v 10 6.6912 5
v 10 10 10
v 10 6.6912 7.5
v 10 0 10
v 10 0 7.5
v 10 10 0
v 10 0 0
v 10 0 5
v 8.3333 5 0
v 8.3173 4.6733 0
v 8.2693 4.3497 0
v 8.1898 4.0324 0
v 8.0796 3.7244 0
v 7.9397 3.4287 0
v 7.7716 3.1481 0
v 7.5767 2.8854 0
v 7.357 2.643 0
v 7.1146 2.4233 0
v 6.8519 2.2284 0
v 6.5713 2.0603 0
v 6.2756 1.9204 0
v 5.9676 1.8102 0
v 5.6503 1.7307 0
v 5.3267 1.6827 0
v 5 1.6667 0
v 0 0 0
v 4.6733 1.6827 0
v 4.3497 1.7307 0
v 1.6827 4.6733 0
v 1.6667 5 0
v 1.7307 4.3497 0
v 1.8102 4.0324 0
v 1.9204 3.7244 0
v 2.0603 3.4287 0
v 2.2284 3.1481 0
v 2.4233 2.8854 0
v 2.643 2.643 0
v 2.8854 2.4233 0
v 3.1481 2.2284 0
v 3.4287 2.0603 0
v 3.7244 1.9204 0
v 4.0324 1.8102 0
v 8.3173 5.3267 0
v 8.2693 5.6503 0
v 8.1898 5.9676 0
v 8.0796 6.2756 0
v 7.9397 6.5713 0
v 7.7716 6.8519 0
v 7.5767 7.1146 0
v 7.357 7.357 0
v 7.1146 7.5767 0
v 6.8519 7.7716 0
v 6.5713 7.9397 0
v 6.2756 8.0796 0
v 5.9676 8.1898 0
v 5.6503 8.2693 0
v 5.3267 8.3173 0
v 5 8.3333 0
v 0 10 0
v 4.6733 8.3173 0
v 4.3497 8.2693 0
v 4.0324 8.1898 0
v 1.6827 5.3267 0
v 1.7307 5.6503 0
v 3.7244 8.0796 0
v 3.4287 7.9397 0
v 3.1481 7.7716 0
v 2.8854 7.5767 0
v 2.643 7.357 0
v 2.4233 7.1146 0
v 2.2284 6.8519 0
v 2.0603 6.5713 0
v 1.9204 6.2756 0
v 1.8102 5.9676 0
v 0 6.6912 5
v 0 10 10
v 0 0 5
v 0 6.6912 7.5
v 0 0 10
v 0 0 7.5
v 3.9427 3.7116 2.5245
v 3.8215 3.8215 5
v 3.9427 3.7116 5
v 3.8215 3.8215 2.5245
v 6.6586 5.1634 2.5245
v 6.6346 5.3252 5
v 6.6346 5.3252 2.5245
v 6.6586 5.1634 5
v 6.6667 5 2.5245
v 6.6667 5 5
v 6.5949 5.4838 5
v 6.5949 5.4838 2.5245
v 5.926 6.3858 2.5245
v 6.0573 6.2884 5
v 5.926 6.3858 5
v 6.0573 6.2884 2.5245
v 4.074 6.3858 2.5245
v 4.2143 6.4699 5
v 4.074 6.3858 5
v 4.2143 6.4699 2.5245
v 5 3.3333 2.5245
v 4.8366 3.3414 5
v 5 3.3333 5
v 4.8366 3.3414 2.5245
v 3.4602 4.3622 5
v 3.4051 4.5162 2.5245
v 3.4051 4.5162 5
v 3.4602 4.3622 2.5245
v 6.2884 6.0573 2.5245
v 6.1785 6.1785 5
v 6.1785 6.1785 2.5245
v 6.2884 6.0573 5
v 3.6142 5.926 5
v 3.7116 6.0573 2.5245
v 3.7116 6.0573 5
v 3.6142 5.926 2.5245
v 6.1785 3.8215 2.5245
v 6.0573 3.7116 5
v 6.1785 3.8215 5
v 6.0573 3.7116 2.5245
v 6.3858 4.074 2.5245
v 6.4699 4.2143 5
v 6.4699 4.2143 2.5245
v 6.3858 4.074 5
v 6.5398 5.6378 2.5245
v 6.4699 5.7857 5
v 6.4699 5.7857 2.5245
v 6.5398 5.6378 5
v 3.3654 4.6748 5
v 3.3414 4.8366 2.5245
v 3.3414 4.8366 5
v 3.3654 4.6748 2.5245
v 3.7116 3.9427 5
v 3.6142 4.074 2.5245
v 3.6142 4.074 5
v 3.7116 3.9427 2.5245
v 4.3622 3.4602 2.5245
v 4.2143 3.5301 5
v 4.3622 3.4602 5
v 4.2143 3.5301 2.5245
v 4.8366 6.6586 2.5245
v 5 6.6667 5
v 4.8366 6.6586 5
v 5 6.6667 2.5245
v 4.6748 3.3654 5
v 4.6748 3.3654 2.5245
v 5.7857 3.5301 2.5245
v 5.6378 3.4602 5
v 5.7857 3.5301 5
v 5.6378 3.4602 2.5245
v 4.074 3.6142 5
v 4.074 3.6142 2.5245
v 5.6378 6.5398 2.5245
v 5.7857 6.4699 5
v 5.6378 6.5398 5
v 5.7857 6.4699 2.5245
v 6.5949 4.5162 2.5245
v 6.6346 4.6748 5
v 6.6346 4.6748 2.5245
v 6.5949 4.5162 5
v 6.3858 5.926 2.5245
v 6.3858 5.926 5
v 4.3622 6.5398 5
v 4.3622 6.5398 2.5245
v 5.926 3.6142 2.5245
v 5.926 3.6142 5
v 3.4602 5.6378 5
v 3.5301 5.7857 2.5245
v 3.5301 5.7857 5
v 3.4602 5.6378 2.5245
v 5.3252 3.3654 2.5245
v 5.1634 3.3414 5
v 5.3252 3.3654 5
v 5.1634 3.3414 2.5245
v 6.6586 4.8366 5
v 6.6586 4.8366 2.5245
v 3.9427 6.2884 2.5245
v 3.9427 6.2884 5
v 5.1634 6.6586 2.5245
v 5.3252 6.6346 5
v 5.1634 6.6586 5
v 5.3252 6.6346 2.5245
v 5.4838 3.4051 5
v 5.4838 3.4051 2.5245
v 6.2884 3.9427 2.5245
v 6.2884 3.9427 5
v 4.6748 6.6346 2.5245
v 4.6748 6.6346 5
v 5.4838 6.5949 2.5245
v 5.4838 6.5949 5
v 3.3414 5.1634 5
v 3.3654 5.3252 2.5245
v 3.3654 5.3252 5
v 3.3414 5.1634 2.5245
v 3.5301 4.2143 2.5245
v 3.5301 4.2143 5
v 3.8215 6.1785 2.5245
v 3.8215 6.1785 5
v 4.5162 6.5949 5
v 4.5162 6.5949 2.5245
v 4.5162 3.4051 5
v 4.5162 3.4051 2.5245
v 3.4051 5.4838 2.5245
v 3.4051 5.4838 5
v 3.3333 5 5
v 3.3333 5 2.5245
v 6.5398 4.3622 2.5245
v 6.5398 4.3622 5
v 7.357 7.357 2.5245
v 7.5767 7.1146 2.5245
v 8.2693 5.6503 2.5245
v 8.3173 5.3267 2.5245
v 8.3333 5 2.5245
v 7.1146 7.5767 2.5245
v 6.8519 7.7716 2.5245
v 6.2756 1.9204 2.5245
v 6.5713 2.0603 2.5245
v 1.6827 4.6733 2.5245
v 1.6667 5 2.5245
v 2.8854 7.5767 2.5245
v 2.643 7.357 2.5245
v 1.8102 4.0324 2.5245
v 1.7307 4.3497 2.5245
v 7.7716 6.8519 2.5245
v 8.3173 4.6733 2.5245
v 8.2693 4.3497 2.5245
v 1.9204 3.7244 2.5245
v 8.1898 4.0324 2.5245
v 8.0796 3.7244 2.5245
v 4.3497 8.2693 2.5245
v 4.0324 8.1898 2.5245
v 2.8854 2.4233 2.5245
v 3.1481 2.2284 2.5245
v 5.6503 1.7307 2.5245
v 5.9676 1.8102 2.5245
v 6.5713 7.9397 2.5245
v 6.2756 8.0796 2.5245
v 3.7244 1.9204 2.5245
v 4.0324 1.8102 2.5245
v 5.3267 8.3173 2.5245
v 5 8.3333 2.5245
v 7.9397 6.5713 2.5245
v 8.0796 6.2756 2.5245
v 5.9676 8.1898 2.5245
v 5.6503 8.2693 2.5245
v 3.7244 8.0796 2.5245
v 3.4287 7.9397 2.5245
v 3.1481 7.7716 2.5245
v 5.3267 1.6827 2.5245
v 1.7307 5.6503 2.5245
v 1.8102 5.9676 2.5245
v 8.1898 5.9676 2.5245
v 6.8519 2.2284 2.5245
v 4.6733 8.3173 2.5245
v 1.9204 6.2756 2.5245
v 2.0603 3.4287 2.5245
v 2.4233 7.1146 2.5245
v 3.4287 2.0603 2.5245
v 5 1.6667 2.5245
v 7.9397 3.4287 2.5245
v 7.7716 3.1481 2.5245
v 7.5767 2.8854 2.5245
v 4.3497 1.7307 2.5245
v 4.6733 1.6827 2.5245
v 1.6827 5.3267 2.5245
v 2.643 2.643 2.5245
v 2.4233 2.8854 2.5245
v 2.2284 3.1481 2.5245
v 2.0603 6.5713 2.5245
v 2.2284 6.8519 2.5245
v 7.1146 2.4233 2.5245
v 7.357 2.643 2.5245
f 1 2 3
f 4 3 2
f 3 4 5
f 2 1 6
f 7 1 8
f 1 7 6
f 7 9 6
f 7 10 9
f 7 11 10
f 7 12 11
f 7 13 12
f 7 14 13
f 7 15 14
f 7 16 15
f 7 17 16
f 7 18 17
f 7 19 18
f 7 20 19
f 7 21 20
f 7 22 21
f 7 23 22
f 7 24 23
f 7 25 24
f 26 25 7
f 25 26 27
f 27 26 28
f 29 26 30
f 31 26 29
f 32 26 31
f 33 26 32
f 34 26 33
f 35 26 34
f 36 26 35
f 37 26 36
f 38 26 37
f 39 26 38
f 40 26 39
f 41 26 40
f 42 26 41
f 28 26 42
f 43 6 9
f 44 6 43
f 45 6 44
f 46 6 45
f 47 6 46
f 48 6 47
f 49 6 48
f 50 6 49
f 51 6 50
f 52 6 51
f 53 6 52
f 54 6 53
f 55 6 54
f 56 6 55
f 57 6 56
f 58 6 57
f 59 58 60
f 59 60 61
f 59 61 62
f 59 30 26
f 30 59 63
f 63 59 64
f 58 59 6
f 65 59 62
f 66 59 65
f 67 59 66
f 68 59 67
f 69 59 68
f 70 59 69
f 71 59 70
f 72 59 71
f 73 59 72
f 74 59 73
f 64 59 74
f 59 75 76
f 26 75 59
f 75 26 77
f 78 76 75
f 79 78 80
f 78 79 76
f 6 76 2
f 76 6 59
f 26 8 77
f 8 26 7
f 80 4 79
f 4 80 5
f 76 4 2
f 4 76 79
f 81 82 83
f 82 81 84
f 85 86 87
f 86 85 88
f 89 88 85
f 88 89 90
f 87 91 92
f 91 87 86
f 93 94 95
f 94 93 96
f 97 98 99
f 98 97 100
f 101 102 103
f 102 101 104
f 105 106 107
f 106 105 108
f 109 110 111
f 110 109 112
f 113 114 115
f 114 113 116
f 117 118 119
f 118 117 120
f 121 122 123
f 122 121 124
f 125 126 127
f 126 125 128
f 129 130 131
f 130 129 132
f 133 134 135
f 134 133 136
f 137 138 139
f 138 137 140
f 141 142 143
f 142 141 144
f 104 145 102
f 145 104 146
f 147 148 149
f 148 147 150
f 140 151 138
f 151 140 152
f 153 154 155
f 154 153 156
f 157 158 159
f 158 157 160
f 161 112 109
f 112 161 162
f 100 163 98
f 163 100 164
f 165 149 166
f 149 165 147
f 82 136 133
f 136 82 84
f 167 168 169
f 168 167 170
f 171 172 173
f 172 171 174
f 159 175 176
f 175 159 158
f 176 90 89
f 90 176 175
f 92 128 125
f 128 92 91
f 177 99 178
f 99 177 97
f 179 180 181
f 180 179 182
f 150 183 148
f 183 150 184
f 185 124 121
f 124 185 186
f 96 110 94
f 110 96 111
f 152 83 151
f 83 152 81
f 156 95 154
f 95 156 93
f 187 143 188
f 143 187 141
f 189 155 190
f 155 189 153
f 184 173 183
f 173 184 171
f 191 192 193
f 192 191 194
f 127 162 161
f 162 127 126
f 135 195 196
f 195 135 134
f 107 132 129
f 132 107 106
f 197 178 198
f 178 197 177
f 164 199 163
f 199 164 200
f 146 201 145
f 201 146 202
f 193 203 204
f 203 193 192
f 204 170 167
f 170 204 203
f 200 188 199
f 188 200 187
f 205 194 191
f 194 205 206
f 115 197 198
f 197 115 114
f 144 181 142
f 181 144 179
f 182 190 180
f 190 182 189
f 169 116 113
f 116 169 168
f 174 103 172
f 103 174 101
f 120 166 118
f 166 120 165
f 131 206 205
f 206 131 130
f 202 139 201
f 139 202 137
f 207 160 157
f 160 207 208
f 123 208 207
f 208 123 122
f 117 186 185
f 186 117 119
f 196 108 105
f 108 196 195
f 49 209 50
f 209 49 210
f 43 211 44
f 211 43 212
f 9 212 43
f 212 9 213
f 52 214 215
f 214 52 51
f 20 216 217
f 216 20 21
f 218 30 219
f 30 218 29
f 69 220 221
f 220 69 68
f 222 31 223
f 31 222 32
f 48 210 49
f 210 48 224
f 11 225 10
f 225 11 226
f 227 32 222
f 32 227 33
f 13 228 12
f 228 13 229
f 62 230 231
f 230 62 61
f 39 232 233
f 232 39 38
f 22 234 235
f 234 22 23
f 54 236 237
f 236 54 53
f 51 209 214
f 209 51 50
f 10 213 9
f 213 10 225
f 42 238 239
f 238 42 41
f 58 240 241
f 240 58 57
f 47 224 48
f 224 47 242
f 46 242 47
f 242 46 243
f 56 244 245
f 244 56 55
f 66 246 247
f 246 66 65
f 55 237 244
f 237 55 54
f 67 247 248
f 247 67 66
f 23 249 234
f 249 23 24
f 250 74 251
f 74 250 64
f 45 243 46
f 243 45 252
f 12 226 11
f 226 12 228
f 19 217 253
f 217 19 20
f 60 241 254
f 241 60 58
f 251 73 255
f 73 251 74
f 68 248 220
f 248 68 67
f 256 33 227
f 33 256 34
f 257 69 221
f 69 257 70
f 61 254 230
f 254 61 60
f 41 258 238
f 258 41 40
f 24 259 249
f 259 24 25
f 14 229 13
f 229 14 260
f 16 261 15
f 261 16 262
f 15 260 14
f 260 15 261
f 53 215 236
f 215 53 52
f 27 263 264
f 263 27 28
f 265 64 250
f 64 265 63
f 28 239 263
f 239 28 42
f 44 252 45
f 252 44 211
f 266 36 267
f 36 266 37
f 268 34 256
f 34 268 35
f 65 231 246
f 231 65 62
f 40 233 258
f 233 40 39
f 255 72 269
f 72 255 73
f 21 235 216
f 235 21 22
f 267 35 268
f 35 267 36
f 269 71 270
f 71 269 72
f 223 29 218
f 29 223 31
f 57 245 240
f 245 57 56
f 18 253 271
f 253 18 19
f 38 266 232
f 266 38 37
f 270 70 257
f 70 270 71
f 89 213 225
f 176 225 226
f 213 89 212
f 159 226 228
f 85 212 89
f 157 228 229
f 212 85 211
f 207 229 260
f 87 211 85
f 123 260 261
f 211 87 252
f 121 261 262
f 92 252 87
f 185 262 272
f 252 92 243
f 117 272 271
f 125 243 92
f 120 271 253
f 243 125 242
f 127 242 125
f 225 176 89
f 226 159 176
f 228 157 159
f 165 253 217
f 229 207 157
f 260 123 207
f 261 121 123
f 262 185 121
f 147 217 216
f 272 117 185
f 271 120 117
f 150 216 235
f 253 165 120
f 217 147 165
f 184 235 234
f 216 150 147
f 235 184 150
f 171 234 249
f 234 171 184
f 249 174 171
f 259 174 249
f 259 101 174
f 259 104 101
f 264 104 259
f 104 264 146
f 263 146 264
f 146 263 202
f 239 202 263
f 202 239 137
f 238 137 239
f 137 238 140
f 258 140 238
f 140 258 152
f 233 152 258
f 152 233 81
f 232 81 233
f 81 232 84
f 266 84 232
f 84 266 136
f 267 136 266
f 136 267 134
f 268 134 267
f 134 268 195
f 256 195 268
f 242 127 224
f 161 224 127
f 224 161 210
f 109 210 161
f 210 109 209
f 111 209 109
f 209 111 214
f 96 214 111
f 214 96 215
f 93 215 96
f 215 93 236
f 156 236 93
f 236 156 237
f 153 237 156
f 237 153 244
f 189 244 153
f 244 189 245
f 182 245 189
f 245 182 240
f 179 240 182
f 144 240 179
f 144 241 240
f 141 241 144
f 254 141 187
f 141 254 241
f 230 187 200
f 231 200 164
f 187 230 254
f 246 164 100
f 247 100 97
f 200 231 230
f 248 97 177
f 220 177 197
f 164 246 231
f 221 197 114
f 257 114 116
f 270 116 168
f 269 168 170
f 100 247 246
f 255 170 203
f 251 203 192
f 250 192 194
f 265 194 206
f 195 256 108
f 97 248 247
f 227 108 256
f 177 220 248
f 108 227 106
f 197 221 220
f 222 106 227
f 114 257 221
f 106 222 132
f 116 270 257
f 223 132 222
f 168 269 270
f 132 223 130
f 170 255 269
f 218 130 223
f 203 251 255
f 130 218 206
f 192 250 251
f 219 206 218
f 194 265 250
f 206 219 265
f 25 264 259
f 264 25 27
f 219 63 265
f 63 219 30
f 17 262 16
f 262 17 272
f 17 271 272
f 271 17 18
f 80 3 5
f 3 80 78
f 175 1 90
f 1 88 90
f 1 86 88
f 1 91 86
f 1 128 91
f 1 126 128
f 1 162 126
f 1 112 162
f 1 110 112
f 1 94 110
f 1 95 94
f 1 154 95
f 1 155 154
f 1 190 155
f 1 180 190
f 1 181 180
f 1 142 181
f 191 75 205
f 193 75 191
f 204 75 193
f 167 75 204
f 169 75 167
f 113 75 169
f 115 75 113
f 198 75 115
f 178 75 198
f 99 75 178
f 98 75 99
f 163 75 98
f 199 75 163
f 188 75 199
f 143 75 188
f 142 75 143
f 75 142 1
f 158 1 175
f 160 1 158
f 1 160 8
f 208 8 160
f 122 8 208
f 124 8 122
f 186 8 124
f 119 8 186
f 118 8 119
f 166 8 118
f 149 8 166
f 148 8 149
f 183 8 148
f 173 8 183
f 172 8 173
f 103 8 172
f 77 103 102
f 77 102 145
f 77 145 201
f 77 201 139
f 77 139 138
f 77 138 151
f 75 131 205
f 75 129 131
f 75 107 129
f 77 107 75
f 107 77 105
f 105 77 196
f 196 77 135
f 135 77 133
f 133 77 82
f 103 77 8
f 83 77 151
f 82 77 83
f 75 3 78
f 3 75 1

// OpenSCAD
// file: ../modules/bed-level-test.scad
module bed_level_test(){
	do_spots = bed_level_test_mode == "spot" || bed_level_test_mode == "both";
	do_lines = bed_level_test_mode == "line" || bed_level_test_mode == "both";
	linewidth = bed_level_line_width*extrusion_width;
	divs = bed_level_divisions-1;
	spot_spacing = [
		(bed_size_x-bed_level_padding*2-bed_level_spot_size[0])/divs,
		(bed_size_y-bed_level_padding*2-bed_level_spot_size[1])/divs
	];
	line_length = do_spots ? [
		bed_size_x-bed_level_padding*2-bed_level_spot_size[0],
		bed_size_y-bed_level_padding*2-bed_level_spot_size[1]
	] : [
		bed_size_x-bed_level_padding*2,
		bed_size_y-bed_level_padding*2
	];
	union() {
		if (do_spots) {
			for (x=[0:divs]){
				for (y=[0:divs]){
					translate([
						spot_spacing[0]*(x-(floor(divs/2))),
						spot_spacing[1]*(y-(floor(divs/2))),
						0
					]){
						cube([bed_level_spot_size[0],bed_level_spot_size[1],layer_height],center=true);
					}
				}
			}
		}
		if (do_lines) {
			for (i=[0:divs]){
				translate([
					0,
					do_spots ? spot_spacing[1]*(i-(floor(divs/2))) : (spot_spacing[1]+(bed_level_spot_size[1]-bed_level_line_width*extrusion_width)/2)*(i-(floor(divs/2))) ,
					0
				]){
					cube([line_length[0],linewidth,layer_height], center=true);
				} 
			}
			for (i=[0:divs]){
				translate([
					do_spots ? spot_spacing[0]*(i-(floor(divs/2))) : (spot_spacing[0]+(bed_level_spot_size[0]-bed_level_line_width*extrusion_width)/2)*(i-(floor(divs/2))),
					0,
					0
				]){
					cube([linewidth,line_length[1],layer_height], center=true);
				} 
			}
		}
	}
}
// file: ../modules/support-test.scad
module support_test(size){
	union(){
		difference(){
			union() {
				cube([size,size,support_cube_height/2]);
				translate([0,0,support_cube_height/2])
				cube([size,size,support_cube_height/2]);
			}
			translate([size/2,size/2,-slice_gap_closing_radius/2]){
				cylinder(r=size/6,h=support_cube_height/2+slice_gap_closing_radius);
				cylinder(r=size/3,h=support_cube_height/4+slice_gap_closing_radius);
			}
			translate([-slice_gap_closing_radius/2,-slice_gap_closing_radius/2,support_cube_height/2])
			cube([size+slice_gap_closing_radius,size*2/3+slice_gap_closing_radius,support_cube_height/4]);
		}
	}
}

support_test_size = [
	support_cube_size,
	support_cube_size,
	support_cube_height
];
// file: ../modules/chimney-test.scad
// /* [Chimney test settings] */
// // Chimney base height (layers)
// chimney_base_height = 10; // 1
// // Chimney top height (layers)
// chimney_top_height = 5; // 1
// // Chimney base wall thickness (extrusions)
// chimney_base_wall_thickness = 4; // 1
// // Chimney top extra thickness (extrusions)
// chimney_top_extra_thickness = 2; // 1
// // Chimney hole start diameter (mm)
// chimney_hole_start_diameter = 3; // 1
// // Chimney hole end diameter (mm)
// chimney_hole_end_diameter = 12; // 1
// // Chimney hole diameter step (mm)
// chimney_hole_diameter_step = 3; // 1


module chimney_single(diameter) {
	difference(){
		union(){
			cylinder(h=chimney_base_height*layer_height, d=diameter+chimney_base_wall_thickness*extrusion_width*2);
			translate([0,0,chimney_base_height*layer_height]){
				cylinder(h=chimney_top_height*layer_height, d=diameter+(chimney_top_extra_thickness+chimney_base_wall_thickness)*extrusion_width*2);
			}
		}
		translate([0,0,-slice_gap_closing_radius/2])
		cylinder(h=(chimney_top_height+chimney_base_height)*layer_height+slice_gap_closing_radius, d=diameter);
	}
}

module chimney_test(){
	translate([
		(chimney_hole_start_diameter+(chimney_base_wall_thickness+chimney_top_extra_thickness)*extrusion_width*2)/2,
		(chimney_hole_end_diameter+(chimney_base_wall_thickness+chimney_top_extra_thickness)*extrusion_width*2)/2,
		0
	])
	for (i= [0:1:(chimney_hole_end_diameter-chimney_hole_start_diameter)/chimney_hole_diameter_step]){
		translate([
			gaussian_sum_with_step(chimney_hole_start_diameter+chimney_hole_diameter_step, chimney_hole_start_diameter+chimney_hole_diameter_step*i, chimney_hole_diameter_step)
				-(chimney_hole_start_diameter/2)*i
				+i*(chimney_base_wall_thickness+chimney_top_extra_thickness)*extrusion_width*2
				+test_padding*extrusion_width*i
			,0,
			0
		]){
			chimney_single(chimney_hole_start_diameter+chimney_hole_diameter_step*i);
		}
	}
}

_i = (chimney_hole_end_diameter-chimney_hole_start_diameter)/chimney_hole_diameter_step;

_chimney_size_x = (chimney_hole_start_diameter+(chimney_base_wall_thickness+chimney_top_extra_thickness)*extrusion_width*2)/2
	+ gaussian_sum_with_step(chimney_hole_start_diameter+chimney_hole_diameter_step, chimney_hole_start_diameter+chimney_hole_diameter_step*_i, chimney_hole_diameter_step)
				-(chimney_hole_start_diameter/2)*_i
				+_i*(chimney_base_wall_thickness+chimney_top_extra_thickness)*extrusion_width*2
				+test_padding*extrusion_width*_i;

chimney_test_size = [
	_chimney_size_x+(chimney_hole_end_diameter+(chimney_base_wall_thickness+chimney_top_extra_thickness)*extrusion_width*2)/2,
	chimney_hole_end_diameter+(chimney_base_wall_thickness+chimney_top_extra_thickness)*extrusion_width*2,
	(chimney_base_height+chimney_top_height)*layer_height
];
// file: ../modules/text-test.scad
module text_test_single(size, debug = false) {
	text_width = size*len(str(size, ": ",ts_string))*ts_adv_width_scaling;
	if (debug){
		%cube([text_width, size*ts_adv_height_scaling, ts_depth*layer_height], center=true);
		color(color_scheme[7%len(color_scheme)]) linear_extrude(height=layer_height)
		text(str(size, ": ",ts_string), size=size, font=ts_adv_font, halign="center", valign="center");
	}
	else {
		text(str(size, ": ",ts_string), size=size, font=ts_adv_font, halign="center", valign="center");
	}
}

module text_test() {
	echo("Generating text test");
	text_max_width = ts_end*len(str(ts_end, ": ",ts_string))*ts_adv_width_scaling;
	difference() {
		cube([text_max_width, text_height_sum, ts_depth*layer_height+slice_gap_closing_radius]);
		union(){
			for (i = [0:1:(ts_end-ts_start)/ts_step]) {
				current_size = ts_start+i*ts_step;
				echo(str("Text size ", i+1, ": size: ", current_size));
				text_width = current_size*len(str(current_size, ": ",ts_string))*ts_adv_width_scaling;
				/* 
				* I legit have no clue how this works or if gaussian sum is applicable here 
				* but it does work so don't touch it
				* Also: this breaks if you use the gaussian sum without factor
				* even though the factor is 1 so... something weird is going on
				*/
				translate_y = gauss_with_step_and_factor(ts_start,ts_start+i*ts_step,ts_step,1)*ts_adv_height_scaling*ts_step-ts_adv_height_scaling*i*ts_step;
				echo(str("Translate y: ", translate_y));
				translate([0,
					translate_y+ts_min_dist*i*extrusion_width,
				0]){
					// Move to +x+y quadrant
					translate([
						text_width/2,
						(current_size*ts_adv_height_scaling)/2,
						// workaround for preview glitching
						ts_depth*layer_height-slice_gap_closing_radius/2
					]){
						linear_extrude(height=ts_depth*layer_height*2, center=true){
							text_test_single(current_size);
						}
					}
				}
			}
		}
	}
}


// Text
text_height_sum = gauss_with_step_and_factor(ts_start,ts_end,ts_step,1)*ts_adv_height_scaling*ts_step-ts_adv_height_scaling*((ts_end-ts_start)/ts_step)*ts_step +ts_end*ts_adv_height_scaling+ts_min_dist*((ts_end-ts_start)/ts_step)*extrusion_width;

text_test_size = [
	ts_end*len(str(ts_end, ": ",ts_string))*ts_adv_width_scaling,
	text_height_sum,
	ts_depth*layer_height
];
// file: ../modules/accuracy-test.scad
module accuracy_cube(size, text_depth) {
	render()
	difference(){
		cube([size, size, size]);
		union(){
			rotate([90,0,0])
			translate([size/2,size/2,0])
			linear_extrude(height=text_depth*layer_height*2,center=true){
				text("-Y", size=(size/2), font="Liberation Mono:style=Regular", halign="center", valign="center");
			}
			translate([size/2,size,size/2])
			rotate([-90,0,0])
			rotate([0,0,180])
			linear_extrude(height=text_depth*layer_height*2,center=true){
				text("+Y", size=(size/2), font="Liberation Mono:style=Regular", halign="center", valign="center");
			}
			rotate([0,-90,0])
			translate([size/2,size/2,0])
			linear_extrude(height=text_depth*layer_height*2,center=true){
				rotate([0,0,-90])
				text("-X", size=(size/2), font="Liberation Mono:style=Regular", halign="center", valign="center");
			}
			translate([size,size/2,size/2])
			rotate([0,90,0])
			linear_extrude(height=text_depth*layer_height*2,center=true){
				rotate([0,0,90])
				text("+X", size=(size/2), font="Liberation Mono:style=Regular", halign="center", valign="center");
			}
			translate([size/2,size/2,0])
			linear_extrude(height=text_depth*layer_height*2,center=true){
				text("-Z", size=(size/2), font="Liberation Mono:style=Regular", halign="center", valign="center");
			}
			translate([size/2,size/2,size])
			linear_extrude(height=text_depth*layer_height*2,center=true){
				text("+Z", size=(size/2), font="Liberation Mono:style=Regular", halign="center", valign="center");
			}

		}
	}
}

module accuracy_cylinder(size, text_depth) {
	render()
	difference(){
		translate([size/2,size/2,size/2])
		cylinder(h=size, r=size/2, center=true);
		translate([size/2,size/2,size])
		linear_extrude(height=text_depth*layer_height*2, center=true)
		text(str(size), size=(size/2)*0.75, font="Liberation Mono:style=Regular", halign="center", valign="center");
	}
}

module accuracy_test(){
	if (dimensional_accuracy_test_mode == "cube" || dimensional_accuracy_test_mode == "both") {
		for (i = [0:1:(dimensional_accuracy_test_end-dimensional_accuracy_test_start)/dimensional_accuracy_test_step]) {
			current_size = dimensional_accuracy_test_start+i*dimensional_accuracy_test_step;
			translate([i==0?0:gaussian_sum_with_step(dimensional_accuracy_test_start,i*dimensional_accuracy_test_step,dimensional_accuracy_test_step)+test_padding*extrusion_width*i,0,0]){
				accuracy_cube(current_size, dimensional_accuracy_test_text_depth);
				echo(str("Cube ", i+1, ": size: ", current_size));
				if (dimensional_accuracy_test_mode == "both") {
					translate([0,current_size+test_padding*extrusion_width,0])
					accuracy_cylinder(current_size, dimensional_accuracy_test_text_depth);
					echo(str("Cylinder ", i+1, ": size: ", current_size));
				}
			}
		}
	}
	if (dimensional_accuracy_test_mode == "cylinder") {
		for (i = [0:1:(dimensional_accuracy_test_end-dimensional_accuracy_test_start)/dimensional_accuracy_test_step]) {
			current_size = dimensional_accuracy_test_start+i*dimensional_accuracy_test_step;
			translate([i==0?0:gaussian_sum_with_step(dimensional_accuracy_test_start,i*dimensional_accuracy_test_step,dimensional_accuracy_test_step)+test_padding*extrusion_width*i,0,0]){
				accuracy_cylinder(current_size, dimensional_accuracy_test_text_depth);
				echo(str("Cylinder ", i+1, ": size: ", current_size));
			}
		}
	}
}


// Accuracy
_dim_mult = dimensional_accuracy_test_mode == "both" ? 1 : 0;
accuracy_test_size = [
	gaussian_sum_with_step(dimensional_accuracy_test_start,dimensional_accuracy_test_end,dimensional_accuracy_test_step)+test_padding*extrusion_width*(dimensional_accuracy_test_end-dimensional_accuracy_test_start)/dimensional_accuracy_test_step,
	dimensional_accuracy_test_end+(dimensional_accuracy_test_end+test_padding*extrusion_width)*_dim_mult,
	dimensional_accuracy_test_end
];
// file: ../modules/sphere-test.scad
module sphere_test_bowl(size) {
	echo(str("Generating bowl, size: ", size));
	difference(){
		difference(){
			sphere(size/2);
			translate([0,0,-size/2]){
				cube([size, size, size], center=true);
			}
		}
		translate([0,0,size/1.5]){
			sphere(size/2);
		}
	}
}

module sphere_test_sphere(size) {
	echo(str("Generating sphere, size: ", size));
	difference(){
		sphere(size/2);
		translate([0,0,-size/2]){
			cube([size, size, size], center=true);
		}
	}
}

module sphere_test() {
	translate([0,sphere_test_end/2,0])
	for (i = [0:1:(sphere_test_end-sphere_test_start)/sphere_test_step]) {
		current_diameter = sphere_test_start+i*sphere_test_step;
		translate_x=gaussian_sum_with_step(sphere_test_start,sphere_test_start+i*sphere_test_step,sphere_test_step)+sphere_test_gap*i*extrusion_width;

		translate([
			translate_x-sphere_test_start/2,
			0, 
			0
		]) {
			if (sphere_test_mode == "bowl") {
				sphere_test_bowl(current_diameter);
			}
			if (sphere_test_mode == "sphere") {
				sphere_test_sphere(current_diameter);
			}
			if (sphere_test_mode == "both") {
				sphere_test_bowl(current_diameter);
				translate([0,sphere_test_end+sphere_test_gap*extrusion_width*2,0]){
					sphere_test_sphere(current_diameter);
				}
			}
		}
	}
}

// Sphere
_sphere_size_mult = sphere_test_mode == "both" ? 2 : 1;
_sphere_gap = sphere_test_mode == "both" ? sphere_test_gap*extrusion_width*2 : 0;

sphere_test_size = [
	gaussian_sum_with_step(sphere_test_start,sphere_test_end,sphere_test_step)
		+sphere_test_end/2
		-sphere_test_gap*extrusion_width*2
		+sphere_test_gap*(sphere_test_end-sphere_test_start)/sphere_test_step*extrusion_width,
	sphere_test_end*_sphere_size_mult+_sphere_gap,
	sphere_test_end/2
];
// file: ../modules/tolerance-test.scad
module tolerance_single_round(diameter, tolerance) {
	translate([
		(diameter+tolerance_test_gap*extrusion_width*2+tolerance_test_end)/2,
		(diameter+tolerance_test_gap*extrusion_width*2+tolerance_test_end)/2, 
		tolerance_test_height*layer_height/2
	])
	difference(){
		cube([diameter+tolerance_test_end+tolerance_test_gap*2*extrusion_width, 
		diameter+tolerance_test_end+tolerance_test_gap*2*extrusion_width, 
		tolerance_test_height*layer_height], 
		center = true);
		cylinder(h=tolerance_test_height*layer_height+slice_gap_closing_radius, 
		r=diameter/2+tolerance, 
		center=true);
	}
}

module tolerance_single_square(size, tolerance) {
	translate([
		(size+tolerance_test_gap*extrusion_width*2+tolerance_test_end)/2,
		(size+tolerance_test_gap*extrusion_width*2+tolerance_test_end)/2, 
		tolerance_test_height*layer_height/2
	])
	difference(){
		cube([size+tolerance_test_end+tolerance_test_gap*2*extrusion_width, 
		size+tolerance_test_end+tolerance_test_gap*2*extrusion_width, 
		tolerance_test_height*layer_height], 
		center = true);
		cube([size+tolerance*2, size+tolerance*2, tolerance_test_height*layer_height+slice_gap_closing_radius], 
		center=true);
	}
}

module tolerance_test() {
	echo("Generating tolerance test");
	if(tolerance_test_mode == "cylinder" || tolerance_test_mode == "both") {
		for (i = [0:1:(tolerance_test_end-tolerance_test_start)/tolerance_test_step]) {
			echo(str("Hole ", i+1, ": ", tolerance_test_start+i*2*tolerance_test_step+tolerance_test_diameter));
			translate([(tolerance_test_diameter+tolerance_test_end+tolerance_test_gap*2*extrusion_width)*i,0,0]){
				tolerance_single_round(tolerance_test_diameter, i*tolerance_test_step+tolerance_test_start);
				if (tolerance_test_mode == "both") {
					translate([0,tolerance_test_diameter+tolerance_test_gap*extrusion_width*2+tolerance_test_end,0]){
						tolerance_single_square(tolerance_test_diameter, i*tolerance_test_step+tolerance_test_start);
					}
				}
			}
		}

		translate([
			(tolerance_test_diameter+tolerance_test_end+tolerance_test_gap*2*extrusion_width)*(tolerance_test_end-tolerance_test_start+tolerance_test_step)/tolerance_test_step+tolerance_test_gap*extrusion_width,
			0,
			-test_bottom_layers*layer_height
		]){
			translate([
				(tolerance_test_diameter+tolerance_test_end)/2+tolerance_test_gap*extrusion_width,
				(tolerance_test_diameter+tolerance_test_gap*extrusion_width*2+tolerance_test_end)/2, 
				tolerance_test_height*layer_height
			]){
				echo(str("Tolerance test peg: ", tolerance_test_diameter));
				cylinder(h=tolerance_test_height*layer_height*2, 
			r=tolerance_test_diameter/2, 
			center=true);
				if (tolerance_test_mode == "both") {
					translate([
						0,
						tolerance_test_diameter+tolerance_test_gap*extrusion_width*2+tolerance_test_end,
						0
					])
					minkowski() {
						cube([
							tolerance_test_diameter-4,
							tolerance_test_diameter-4,
							tolerance_test_height*layer_height*2/2
							], center=true);
						cylinder(h=tolerance_test_height*layer_height*2/2, r=2,center=true);
					}
				}
			}
		}
	}
	if(tolerance_test_mode == "cube") {
		for (i = [0:1:(tolerance_test_end-tolerance_test_start)/tolerance_test_step]) {
			echo(str("Hole ", i+1, ": ", tolerance_test_start+i*tolerance_test_step+tolerance_test_diameter));
			translate([(tolerance_test_diameter+tolerance_test_end+tolerance_test_gap*2*extrusion_width)*i,0,0]){
				tolerance_single_square(tolerance_test_diameter, i*tolerance_test_step+tolerance_test_start);
				
			}
		}

		translate([
			(tolerance_test_diameter+tolerance_test_end+tolerance_test_gap*2*extrusion_width)*(tolerance_test_end-tolerance_test_start+tolerance_test_step)/tolerance_test_step+tolerance_test_gap*extrusion_width,
			0,
			-test_bottom_layers*layer_height
		]){
			translate([
				(tolerance_test_diameter+tolerance_test_end)/2+tolerance_test_gap*extrusion_width,
				(tolerance_test_diameter+tolerance_test_gap*extrusion_width*2+tolerance_test_end)/2, 
				tolerance_test_height*layer_height
			]){
				echo(str("Tolerance test peg: ", tolerance_test_diameter));
				minkowski() {
					cube([
						tolerance_test_diameter-4,
						tolerance_test_diameter-4,
						tolerance_test_height*layer_height*2/2
						], center=true);
					cylinder(h=tolerance_test_height*layer_height*2/2, r=2,center=true);
				}
			}
		}
	}
}

// Tolerance
_tol_size_mult = tolerance_test_mode == "both" ? 2 : 1;

tolerance_test_size = [
	(tolerance_test_end+tolerance_test_diameter+tolerance_test_gap*2*extrusion_width)*((tolerance_test_end-tolerance_test_start)/tolerance_test_step+2),
	(tolerance_test_end+tolerance_test_diameter+tolerance_test_gap*2*extrusion_width)*_tol_size_mult,
	tolerance_test_height*layer_height
];
// file: ../modules/bridging-test.scad
module bridge_single(length) {
	cube([bridging_test_bridge_width*extrusion_width, bridging_test_bridge_width*extrusion_width, bridging_test_tower_height*layer_height ]);
	translate([length+extrusion_width*bridging_test_bridge_width,0,0]){
		cube([bridging_test_bridge_width*extrusion_width, bridging_test_bridge_width*extrusion_width, bridging_test_tower_height*layer_height ]);
	}
	translate([0,0,bridging_test_tower_height*layer_height]){
		cube([length+bridging_test_bridge_width*extrusion_width*2, bridging_test_bridge_width*extrusion_width, bridging_test_bridge_height*layer_height ]);
	}
}

module bridging_test(){
	echo("Generating bridging test");
	for (i = [0:1:(bridging_test_end-bridging_test_start)/bridging_test_step]) {
		echo(str("Bridge ", i+1, ": length: ", bridging_test_start+ i*bridging_test_step));
		translate([0, (bridging_test_gap*extrusion_width+bridging_test_bridge_width*extrusion_width)*i, 0]) {
			bridge_single(bridging_test_start+ i*bridging_test_step);
		}
	}
}

bridging_test_size = [
	bridging_test_bridge_width*2*extrusion_width+bridging_test_end-((bridging_test_end-bridging_test_start)%bridging_test_step),
	(bridging_test_gap*extrusion_width+bridging_test_bridge_width*extrusion_width)*((bridging_test_end-bridging_test_start)/bridging_test_step)+bridging_test_bridge_width*extrusion_width,
	bridging_test_tower_height*layer_height + bridging_test_bridge_height*layer_height
];
// file: ../modules/peg-hole-test.scad
module peg_single(size, height=peg_hole_test_height*layer_height) {
	if (size < slice_gap_closing_radius) {
		echo(str("Peg size too small, setting radius to slice_gap_closing_radius: ", slice_gap_closing_radius));
		cylinder(h=height, r=slice_gap_closing_radius);
	}
	else {
		cylinder(h=height, r=size);
	}
}

module peg_hole_test() {
	echo("Generating peg hole test");
	translate([(peg_hole_test_max_mult*extrusion_width+peg_hole_test_min_dist*extrusion_width),(peg_hole_test_max_mult*extrusion_width),0]){
		for (i = [0:peg_hole_test_step_mult:peg_hole_test_max_mult-peg_hole_test_min_mult]) {
			echo(str("Peg ", i+1, ": size: ", (i+peg_hole_test_min_mult)*extrusion_width));
			translate([_peg_offset*i/peg_hole_test_step_mult*2, 0, 0]) {
				peg_single((i+peg_hole_test_min_mult)*extrusion_width);
			}
		}
		translate([0, (peg_hole_test_max_mult)*extrusion_width*2+(peg_hole_test_min_dist*extrusion_width)*2, 0]){
			difference(){
				translate([
					-(peg_hole_test_max_mult*extrusion_width+peg_hole_test_min_dist*extrusion_width),
					-(peg_hole_test_max_mult*extrusion_width+peg_hole_test_min_dist*extrusion_width),
					0
					]){
					cube([
						_peg_offset*(peg_hole_test_max_mult-peg_hole_test_min_mult+peg_hole_test_step_mult-((peg_hole_test_max_mult-peg_hole_test_min_mult)%peg_hole_test_step_mult))/peg_hole_test_step_mult*2,
						(peg_hole_test_max_mult*extrusion_width+peg_hole_test_min_dist*extrusion_width)*2,
						peg_hole_test_height*layer_height-slice_gap_closing_radius
						]);
				}
				for (i = [0:peg_hole_test_step_mult:peg_hole_test_max_mult-peg_hole_test_min_mult]) {
					echo(str("Hole ", i+1, ": size: ", (peg_hole_test_max_mult-i)*extrusion_width));
					translate([
						_peg_offset*i/peg_hole_test_step_mult*2, 
						0, 
						-0.5
						]) {
						peg_single((peg_hole_test_max_mult-i)*extrusion_width, peg_hole_test_height*layer_height+1);
					}
				}
			}
		}
	}
}


// Peg & hole test calculations
_peg_offset = extrusion_width*peg_hole_test_max_mult + peg_hole_test_min_dist*extrusion_width;

peg_hole_test_size = [
	_peg_offset*(peg_hole_test_max_mult-peg_hole_test_min_mult+peg_hole_test_step_mult-((peg_hole_test_max_mult-peg_hole_test_min_mult)%peg_hole_test_step_mult))/peg_hole_test_step_mult*2,
	(peg_hole_test_max_mult*extrusion_width+peg_hole_test_min_dist*extrusion_width)*2*2-peg_hole_test_min_dist*extrusion_width,
	peg_hole_test_height*layer_height
];
// file: ../modules/overhang-test.scad
module overhang_single(angle) {
	polyhedron_points = [
		[1, 0, 0], // 0
		[1, overhang_test_length, 0], // 1
		[0, overhang_test_length, 0], // 2
		[0, 0, 0], // 3
		[1+tan(angle)*(overhang_test_height*layer_height), 0, (overhang_test_height*layer_height)], // 04
		[1+tan(angle)*(overhang_test_height*layer_height), overhang_test_length, (overhang_test_height*layer_height)], // 5
		[0, overhang_test_length, (overhang_test_height*layer_height)], // 6
		[0, 0, (overhang_test_height*layer_height)], // 7
	];
	polyhedron_faces = [
		[0,1,2,3],  // bottom
		[4,5,1,0],  // front
		[7,6,5,4],  // top
		[5,6,2,1],  // right
		[6,7,3,2],  // back
		[7,4,0,3] // left
	];
	union(){
		polyhedron(points=polyhedron_points, faces=polyhedron_faces);
		translate([0,0,(overhang_test_height*layer_height)])
		cube([
			1+tan(angle)*(overhang_test_height*layer_height), 
			overhang_test_length, 
			(overhang_test_extra_layers*layer_height)]);
	}
}

module overhang_test() {
	echo("Generating overhang test");
	for (i = [0:1:(overhang_test_end_angle-overhang_test_start_angle)/overhang_test_angle_step]) {
		translate([0, 0, (overhang_test_height*layer_height+(overhang_test_extra_layers*layer_height))*i]) {
			echo(str("Overhang ", i+1, ": angle: ", overhang_test_end_angle - i*overhang_test_angle_step));
			overhang_single(overhang_test_end_angle - i*overhang_test_angle_step);
		}
	}
}

overhang_test_size = [
	1+tan(max(overhang_test_start_angle, overhang_test_end_angle))*(overhang_test_height*layer_height),
	overhang_test_length,
	(overhang_test_height*layer_height)*((overhang_test_end_angle-overhang_test_start_angle)/overhang_test_angle_step+1)+overhang_test_extra_layers*layer_height*((overhang_test_end_angle-overhang_test_start_angle)/overhang_test_angle_step+1)
];
// file: ../modules/stringing-test.scad
module stringing_tower_single() {
	polyhedron_points = [
		[0, 0, 0],
		[0, _stringing_bottom_width, 0],
		[_stringing_bottom_width, _stringing_bottom_width, 0],
		[_stringing_bottom_width, 0, 0],
		[_stringing_top_offset, _stringing_top_offset, stringing_tower_height],
		[_stringing_top_offset, _stringing_bottom_width - _stringing_top_offset, stringing_tower_height],
		[_stringing_bottom_width - _stringing_top_offset, _stringing_bottom_width - _stringing_top_offset, stringing_tower_height],
		[_stringing_bottom_width - _stringing_top_offset, _stringing_top_offset, stringing_tower_height]
	];
	polyhedron_faces = [
		[0,1,2,3],  // bottom
		[4,5,1,0],  // front
		[7,6,5,4],  // top
		[5,6,2,1],  // right
		[6,7,3,2],  // back
		[7,4,0,3] // left
	];
	polyhedron(points=polyhedron_points, faces=polyhedron_faces);
}

module stringing_test() {
	echo("Generating stringing test");
	for (i = [0:stringing_tower_count_x-1]) {
		for (j = [0:stringing_tower_count_y-1]) {
			translate([i*(stringing_tower_min_dist + _stringing_bottom_width), j*(stringing_tower_min_dist + _stringing_bottom_width), 0]) {
				stringing_tower_single();
			}
		}
	}
}

// Stringing test calculations
_stringing_top_width = extrusion_width*stringing_test_top_extrusions;
_stringing_bottom_width = extrusion_width*stringing_test_bottom_extrusions;
_stringing_top_offset = (_stringing_bottom_width - _stringing_top_width)/2;

stringing_test_size = [
	(stringing_tower_count_x-1)*(stringing_tower_min_dist + _stringing_bottom_width)+_stringing_bottom_width,
	(stringing_tower_count_y-1)*(stringing_tower_min_dist + _stringing_bottom_width)+_stringing_bottom_width,
	stringing_tower_height
];
// main file
include <../3d-printer-testing-suite.scad>

/* [Hidden] */
color_scheme = ["lightblue"];
test_type = "support";
$vpt=[5,5,5];
$vpr=[55+180,0,-25];
$vpd=45;
